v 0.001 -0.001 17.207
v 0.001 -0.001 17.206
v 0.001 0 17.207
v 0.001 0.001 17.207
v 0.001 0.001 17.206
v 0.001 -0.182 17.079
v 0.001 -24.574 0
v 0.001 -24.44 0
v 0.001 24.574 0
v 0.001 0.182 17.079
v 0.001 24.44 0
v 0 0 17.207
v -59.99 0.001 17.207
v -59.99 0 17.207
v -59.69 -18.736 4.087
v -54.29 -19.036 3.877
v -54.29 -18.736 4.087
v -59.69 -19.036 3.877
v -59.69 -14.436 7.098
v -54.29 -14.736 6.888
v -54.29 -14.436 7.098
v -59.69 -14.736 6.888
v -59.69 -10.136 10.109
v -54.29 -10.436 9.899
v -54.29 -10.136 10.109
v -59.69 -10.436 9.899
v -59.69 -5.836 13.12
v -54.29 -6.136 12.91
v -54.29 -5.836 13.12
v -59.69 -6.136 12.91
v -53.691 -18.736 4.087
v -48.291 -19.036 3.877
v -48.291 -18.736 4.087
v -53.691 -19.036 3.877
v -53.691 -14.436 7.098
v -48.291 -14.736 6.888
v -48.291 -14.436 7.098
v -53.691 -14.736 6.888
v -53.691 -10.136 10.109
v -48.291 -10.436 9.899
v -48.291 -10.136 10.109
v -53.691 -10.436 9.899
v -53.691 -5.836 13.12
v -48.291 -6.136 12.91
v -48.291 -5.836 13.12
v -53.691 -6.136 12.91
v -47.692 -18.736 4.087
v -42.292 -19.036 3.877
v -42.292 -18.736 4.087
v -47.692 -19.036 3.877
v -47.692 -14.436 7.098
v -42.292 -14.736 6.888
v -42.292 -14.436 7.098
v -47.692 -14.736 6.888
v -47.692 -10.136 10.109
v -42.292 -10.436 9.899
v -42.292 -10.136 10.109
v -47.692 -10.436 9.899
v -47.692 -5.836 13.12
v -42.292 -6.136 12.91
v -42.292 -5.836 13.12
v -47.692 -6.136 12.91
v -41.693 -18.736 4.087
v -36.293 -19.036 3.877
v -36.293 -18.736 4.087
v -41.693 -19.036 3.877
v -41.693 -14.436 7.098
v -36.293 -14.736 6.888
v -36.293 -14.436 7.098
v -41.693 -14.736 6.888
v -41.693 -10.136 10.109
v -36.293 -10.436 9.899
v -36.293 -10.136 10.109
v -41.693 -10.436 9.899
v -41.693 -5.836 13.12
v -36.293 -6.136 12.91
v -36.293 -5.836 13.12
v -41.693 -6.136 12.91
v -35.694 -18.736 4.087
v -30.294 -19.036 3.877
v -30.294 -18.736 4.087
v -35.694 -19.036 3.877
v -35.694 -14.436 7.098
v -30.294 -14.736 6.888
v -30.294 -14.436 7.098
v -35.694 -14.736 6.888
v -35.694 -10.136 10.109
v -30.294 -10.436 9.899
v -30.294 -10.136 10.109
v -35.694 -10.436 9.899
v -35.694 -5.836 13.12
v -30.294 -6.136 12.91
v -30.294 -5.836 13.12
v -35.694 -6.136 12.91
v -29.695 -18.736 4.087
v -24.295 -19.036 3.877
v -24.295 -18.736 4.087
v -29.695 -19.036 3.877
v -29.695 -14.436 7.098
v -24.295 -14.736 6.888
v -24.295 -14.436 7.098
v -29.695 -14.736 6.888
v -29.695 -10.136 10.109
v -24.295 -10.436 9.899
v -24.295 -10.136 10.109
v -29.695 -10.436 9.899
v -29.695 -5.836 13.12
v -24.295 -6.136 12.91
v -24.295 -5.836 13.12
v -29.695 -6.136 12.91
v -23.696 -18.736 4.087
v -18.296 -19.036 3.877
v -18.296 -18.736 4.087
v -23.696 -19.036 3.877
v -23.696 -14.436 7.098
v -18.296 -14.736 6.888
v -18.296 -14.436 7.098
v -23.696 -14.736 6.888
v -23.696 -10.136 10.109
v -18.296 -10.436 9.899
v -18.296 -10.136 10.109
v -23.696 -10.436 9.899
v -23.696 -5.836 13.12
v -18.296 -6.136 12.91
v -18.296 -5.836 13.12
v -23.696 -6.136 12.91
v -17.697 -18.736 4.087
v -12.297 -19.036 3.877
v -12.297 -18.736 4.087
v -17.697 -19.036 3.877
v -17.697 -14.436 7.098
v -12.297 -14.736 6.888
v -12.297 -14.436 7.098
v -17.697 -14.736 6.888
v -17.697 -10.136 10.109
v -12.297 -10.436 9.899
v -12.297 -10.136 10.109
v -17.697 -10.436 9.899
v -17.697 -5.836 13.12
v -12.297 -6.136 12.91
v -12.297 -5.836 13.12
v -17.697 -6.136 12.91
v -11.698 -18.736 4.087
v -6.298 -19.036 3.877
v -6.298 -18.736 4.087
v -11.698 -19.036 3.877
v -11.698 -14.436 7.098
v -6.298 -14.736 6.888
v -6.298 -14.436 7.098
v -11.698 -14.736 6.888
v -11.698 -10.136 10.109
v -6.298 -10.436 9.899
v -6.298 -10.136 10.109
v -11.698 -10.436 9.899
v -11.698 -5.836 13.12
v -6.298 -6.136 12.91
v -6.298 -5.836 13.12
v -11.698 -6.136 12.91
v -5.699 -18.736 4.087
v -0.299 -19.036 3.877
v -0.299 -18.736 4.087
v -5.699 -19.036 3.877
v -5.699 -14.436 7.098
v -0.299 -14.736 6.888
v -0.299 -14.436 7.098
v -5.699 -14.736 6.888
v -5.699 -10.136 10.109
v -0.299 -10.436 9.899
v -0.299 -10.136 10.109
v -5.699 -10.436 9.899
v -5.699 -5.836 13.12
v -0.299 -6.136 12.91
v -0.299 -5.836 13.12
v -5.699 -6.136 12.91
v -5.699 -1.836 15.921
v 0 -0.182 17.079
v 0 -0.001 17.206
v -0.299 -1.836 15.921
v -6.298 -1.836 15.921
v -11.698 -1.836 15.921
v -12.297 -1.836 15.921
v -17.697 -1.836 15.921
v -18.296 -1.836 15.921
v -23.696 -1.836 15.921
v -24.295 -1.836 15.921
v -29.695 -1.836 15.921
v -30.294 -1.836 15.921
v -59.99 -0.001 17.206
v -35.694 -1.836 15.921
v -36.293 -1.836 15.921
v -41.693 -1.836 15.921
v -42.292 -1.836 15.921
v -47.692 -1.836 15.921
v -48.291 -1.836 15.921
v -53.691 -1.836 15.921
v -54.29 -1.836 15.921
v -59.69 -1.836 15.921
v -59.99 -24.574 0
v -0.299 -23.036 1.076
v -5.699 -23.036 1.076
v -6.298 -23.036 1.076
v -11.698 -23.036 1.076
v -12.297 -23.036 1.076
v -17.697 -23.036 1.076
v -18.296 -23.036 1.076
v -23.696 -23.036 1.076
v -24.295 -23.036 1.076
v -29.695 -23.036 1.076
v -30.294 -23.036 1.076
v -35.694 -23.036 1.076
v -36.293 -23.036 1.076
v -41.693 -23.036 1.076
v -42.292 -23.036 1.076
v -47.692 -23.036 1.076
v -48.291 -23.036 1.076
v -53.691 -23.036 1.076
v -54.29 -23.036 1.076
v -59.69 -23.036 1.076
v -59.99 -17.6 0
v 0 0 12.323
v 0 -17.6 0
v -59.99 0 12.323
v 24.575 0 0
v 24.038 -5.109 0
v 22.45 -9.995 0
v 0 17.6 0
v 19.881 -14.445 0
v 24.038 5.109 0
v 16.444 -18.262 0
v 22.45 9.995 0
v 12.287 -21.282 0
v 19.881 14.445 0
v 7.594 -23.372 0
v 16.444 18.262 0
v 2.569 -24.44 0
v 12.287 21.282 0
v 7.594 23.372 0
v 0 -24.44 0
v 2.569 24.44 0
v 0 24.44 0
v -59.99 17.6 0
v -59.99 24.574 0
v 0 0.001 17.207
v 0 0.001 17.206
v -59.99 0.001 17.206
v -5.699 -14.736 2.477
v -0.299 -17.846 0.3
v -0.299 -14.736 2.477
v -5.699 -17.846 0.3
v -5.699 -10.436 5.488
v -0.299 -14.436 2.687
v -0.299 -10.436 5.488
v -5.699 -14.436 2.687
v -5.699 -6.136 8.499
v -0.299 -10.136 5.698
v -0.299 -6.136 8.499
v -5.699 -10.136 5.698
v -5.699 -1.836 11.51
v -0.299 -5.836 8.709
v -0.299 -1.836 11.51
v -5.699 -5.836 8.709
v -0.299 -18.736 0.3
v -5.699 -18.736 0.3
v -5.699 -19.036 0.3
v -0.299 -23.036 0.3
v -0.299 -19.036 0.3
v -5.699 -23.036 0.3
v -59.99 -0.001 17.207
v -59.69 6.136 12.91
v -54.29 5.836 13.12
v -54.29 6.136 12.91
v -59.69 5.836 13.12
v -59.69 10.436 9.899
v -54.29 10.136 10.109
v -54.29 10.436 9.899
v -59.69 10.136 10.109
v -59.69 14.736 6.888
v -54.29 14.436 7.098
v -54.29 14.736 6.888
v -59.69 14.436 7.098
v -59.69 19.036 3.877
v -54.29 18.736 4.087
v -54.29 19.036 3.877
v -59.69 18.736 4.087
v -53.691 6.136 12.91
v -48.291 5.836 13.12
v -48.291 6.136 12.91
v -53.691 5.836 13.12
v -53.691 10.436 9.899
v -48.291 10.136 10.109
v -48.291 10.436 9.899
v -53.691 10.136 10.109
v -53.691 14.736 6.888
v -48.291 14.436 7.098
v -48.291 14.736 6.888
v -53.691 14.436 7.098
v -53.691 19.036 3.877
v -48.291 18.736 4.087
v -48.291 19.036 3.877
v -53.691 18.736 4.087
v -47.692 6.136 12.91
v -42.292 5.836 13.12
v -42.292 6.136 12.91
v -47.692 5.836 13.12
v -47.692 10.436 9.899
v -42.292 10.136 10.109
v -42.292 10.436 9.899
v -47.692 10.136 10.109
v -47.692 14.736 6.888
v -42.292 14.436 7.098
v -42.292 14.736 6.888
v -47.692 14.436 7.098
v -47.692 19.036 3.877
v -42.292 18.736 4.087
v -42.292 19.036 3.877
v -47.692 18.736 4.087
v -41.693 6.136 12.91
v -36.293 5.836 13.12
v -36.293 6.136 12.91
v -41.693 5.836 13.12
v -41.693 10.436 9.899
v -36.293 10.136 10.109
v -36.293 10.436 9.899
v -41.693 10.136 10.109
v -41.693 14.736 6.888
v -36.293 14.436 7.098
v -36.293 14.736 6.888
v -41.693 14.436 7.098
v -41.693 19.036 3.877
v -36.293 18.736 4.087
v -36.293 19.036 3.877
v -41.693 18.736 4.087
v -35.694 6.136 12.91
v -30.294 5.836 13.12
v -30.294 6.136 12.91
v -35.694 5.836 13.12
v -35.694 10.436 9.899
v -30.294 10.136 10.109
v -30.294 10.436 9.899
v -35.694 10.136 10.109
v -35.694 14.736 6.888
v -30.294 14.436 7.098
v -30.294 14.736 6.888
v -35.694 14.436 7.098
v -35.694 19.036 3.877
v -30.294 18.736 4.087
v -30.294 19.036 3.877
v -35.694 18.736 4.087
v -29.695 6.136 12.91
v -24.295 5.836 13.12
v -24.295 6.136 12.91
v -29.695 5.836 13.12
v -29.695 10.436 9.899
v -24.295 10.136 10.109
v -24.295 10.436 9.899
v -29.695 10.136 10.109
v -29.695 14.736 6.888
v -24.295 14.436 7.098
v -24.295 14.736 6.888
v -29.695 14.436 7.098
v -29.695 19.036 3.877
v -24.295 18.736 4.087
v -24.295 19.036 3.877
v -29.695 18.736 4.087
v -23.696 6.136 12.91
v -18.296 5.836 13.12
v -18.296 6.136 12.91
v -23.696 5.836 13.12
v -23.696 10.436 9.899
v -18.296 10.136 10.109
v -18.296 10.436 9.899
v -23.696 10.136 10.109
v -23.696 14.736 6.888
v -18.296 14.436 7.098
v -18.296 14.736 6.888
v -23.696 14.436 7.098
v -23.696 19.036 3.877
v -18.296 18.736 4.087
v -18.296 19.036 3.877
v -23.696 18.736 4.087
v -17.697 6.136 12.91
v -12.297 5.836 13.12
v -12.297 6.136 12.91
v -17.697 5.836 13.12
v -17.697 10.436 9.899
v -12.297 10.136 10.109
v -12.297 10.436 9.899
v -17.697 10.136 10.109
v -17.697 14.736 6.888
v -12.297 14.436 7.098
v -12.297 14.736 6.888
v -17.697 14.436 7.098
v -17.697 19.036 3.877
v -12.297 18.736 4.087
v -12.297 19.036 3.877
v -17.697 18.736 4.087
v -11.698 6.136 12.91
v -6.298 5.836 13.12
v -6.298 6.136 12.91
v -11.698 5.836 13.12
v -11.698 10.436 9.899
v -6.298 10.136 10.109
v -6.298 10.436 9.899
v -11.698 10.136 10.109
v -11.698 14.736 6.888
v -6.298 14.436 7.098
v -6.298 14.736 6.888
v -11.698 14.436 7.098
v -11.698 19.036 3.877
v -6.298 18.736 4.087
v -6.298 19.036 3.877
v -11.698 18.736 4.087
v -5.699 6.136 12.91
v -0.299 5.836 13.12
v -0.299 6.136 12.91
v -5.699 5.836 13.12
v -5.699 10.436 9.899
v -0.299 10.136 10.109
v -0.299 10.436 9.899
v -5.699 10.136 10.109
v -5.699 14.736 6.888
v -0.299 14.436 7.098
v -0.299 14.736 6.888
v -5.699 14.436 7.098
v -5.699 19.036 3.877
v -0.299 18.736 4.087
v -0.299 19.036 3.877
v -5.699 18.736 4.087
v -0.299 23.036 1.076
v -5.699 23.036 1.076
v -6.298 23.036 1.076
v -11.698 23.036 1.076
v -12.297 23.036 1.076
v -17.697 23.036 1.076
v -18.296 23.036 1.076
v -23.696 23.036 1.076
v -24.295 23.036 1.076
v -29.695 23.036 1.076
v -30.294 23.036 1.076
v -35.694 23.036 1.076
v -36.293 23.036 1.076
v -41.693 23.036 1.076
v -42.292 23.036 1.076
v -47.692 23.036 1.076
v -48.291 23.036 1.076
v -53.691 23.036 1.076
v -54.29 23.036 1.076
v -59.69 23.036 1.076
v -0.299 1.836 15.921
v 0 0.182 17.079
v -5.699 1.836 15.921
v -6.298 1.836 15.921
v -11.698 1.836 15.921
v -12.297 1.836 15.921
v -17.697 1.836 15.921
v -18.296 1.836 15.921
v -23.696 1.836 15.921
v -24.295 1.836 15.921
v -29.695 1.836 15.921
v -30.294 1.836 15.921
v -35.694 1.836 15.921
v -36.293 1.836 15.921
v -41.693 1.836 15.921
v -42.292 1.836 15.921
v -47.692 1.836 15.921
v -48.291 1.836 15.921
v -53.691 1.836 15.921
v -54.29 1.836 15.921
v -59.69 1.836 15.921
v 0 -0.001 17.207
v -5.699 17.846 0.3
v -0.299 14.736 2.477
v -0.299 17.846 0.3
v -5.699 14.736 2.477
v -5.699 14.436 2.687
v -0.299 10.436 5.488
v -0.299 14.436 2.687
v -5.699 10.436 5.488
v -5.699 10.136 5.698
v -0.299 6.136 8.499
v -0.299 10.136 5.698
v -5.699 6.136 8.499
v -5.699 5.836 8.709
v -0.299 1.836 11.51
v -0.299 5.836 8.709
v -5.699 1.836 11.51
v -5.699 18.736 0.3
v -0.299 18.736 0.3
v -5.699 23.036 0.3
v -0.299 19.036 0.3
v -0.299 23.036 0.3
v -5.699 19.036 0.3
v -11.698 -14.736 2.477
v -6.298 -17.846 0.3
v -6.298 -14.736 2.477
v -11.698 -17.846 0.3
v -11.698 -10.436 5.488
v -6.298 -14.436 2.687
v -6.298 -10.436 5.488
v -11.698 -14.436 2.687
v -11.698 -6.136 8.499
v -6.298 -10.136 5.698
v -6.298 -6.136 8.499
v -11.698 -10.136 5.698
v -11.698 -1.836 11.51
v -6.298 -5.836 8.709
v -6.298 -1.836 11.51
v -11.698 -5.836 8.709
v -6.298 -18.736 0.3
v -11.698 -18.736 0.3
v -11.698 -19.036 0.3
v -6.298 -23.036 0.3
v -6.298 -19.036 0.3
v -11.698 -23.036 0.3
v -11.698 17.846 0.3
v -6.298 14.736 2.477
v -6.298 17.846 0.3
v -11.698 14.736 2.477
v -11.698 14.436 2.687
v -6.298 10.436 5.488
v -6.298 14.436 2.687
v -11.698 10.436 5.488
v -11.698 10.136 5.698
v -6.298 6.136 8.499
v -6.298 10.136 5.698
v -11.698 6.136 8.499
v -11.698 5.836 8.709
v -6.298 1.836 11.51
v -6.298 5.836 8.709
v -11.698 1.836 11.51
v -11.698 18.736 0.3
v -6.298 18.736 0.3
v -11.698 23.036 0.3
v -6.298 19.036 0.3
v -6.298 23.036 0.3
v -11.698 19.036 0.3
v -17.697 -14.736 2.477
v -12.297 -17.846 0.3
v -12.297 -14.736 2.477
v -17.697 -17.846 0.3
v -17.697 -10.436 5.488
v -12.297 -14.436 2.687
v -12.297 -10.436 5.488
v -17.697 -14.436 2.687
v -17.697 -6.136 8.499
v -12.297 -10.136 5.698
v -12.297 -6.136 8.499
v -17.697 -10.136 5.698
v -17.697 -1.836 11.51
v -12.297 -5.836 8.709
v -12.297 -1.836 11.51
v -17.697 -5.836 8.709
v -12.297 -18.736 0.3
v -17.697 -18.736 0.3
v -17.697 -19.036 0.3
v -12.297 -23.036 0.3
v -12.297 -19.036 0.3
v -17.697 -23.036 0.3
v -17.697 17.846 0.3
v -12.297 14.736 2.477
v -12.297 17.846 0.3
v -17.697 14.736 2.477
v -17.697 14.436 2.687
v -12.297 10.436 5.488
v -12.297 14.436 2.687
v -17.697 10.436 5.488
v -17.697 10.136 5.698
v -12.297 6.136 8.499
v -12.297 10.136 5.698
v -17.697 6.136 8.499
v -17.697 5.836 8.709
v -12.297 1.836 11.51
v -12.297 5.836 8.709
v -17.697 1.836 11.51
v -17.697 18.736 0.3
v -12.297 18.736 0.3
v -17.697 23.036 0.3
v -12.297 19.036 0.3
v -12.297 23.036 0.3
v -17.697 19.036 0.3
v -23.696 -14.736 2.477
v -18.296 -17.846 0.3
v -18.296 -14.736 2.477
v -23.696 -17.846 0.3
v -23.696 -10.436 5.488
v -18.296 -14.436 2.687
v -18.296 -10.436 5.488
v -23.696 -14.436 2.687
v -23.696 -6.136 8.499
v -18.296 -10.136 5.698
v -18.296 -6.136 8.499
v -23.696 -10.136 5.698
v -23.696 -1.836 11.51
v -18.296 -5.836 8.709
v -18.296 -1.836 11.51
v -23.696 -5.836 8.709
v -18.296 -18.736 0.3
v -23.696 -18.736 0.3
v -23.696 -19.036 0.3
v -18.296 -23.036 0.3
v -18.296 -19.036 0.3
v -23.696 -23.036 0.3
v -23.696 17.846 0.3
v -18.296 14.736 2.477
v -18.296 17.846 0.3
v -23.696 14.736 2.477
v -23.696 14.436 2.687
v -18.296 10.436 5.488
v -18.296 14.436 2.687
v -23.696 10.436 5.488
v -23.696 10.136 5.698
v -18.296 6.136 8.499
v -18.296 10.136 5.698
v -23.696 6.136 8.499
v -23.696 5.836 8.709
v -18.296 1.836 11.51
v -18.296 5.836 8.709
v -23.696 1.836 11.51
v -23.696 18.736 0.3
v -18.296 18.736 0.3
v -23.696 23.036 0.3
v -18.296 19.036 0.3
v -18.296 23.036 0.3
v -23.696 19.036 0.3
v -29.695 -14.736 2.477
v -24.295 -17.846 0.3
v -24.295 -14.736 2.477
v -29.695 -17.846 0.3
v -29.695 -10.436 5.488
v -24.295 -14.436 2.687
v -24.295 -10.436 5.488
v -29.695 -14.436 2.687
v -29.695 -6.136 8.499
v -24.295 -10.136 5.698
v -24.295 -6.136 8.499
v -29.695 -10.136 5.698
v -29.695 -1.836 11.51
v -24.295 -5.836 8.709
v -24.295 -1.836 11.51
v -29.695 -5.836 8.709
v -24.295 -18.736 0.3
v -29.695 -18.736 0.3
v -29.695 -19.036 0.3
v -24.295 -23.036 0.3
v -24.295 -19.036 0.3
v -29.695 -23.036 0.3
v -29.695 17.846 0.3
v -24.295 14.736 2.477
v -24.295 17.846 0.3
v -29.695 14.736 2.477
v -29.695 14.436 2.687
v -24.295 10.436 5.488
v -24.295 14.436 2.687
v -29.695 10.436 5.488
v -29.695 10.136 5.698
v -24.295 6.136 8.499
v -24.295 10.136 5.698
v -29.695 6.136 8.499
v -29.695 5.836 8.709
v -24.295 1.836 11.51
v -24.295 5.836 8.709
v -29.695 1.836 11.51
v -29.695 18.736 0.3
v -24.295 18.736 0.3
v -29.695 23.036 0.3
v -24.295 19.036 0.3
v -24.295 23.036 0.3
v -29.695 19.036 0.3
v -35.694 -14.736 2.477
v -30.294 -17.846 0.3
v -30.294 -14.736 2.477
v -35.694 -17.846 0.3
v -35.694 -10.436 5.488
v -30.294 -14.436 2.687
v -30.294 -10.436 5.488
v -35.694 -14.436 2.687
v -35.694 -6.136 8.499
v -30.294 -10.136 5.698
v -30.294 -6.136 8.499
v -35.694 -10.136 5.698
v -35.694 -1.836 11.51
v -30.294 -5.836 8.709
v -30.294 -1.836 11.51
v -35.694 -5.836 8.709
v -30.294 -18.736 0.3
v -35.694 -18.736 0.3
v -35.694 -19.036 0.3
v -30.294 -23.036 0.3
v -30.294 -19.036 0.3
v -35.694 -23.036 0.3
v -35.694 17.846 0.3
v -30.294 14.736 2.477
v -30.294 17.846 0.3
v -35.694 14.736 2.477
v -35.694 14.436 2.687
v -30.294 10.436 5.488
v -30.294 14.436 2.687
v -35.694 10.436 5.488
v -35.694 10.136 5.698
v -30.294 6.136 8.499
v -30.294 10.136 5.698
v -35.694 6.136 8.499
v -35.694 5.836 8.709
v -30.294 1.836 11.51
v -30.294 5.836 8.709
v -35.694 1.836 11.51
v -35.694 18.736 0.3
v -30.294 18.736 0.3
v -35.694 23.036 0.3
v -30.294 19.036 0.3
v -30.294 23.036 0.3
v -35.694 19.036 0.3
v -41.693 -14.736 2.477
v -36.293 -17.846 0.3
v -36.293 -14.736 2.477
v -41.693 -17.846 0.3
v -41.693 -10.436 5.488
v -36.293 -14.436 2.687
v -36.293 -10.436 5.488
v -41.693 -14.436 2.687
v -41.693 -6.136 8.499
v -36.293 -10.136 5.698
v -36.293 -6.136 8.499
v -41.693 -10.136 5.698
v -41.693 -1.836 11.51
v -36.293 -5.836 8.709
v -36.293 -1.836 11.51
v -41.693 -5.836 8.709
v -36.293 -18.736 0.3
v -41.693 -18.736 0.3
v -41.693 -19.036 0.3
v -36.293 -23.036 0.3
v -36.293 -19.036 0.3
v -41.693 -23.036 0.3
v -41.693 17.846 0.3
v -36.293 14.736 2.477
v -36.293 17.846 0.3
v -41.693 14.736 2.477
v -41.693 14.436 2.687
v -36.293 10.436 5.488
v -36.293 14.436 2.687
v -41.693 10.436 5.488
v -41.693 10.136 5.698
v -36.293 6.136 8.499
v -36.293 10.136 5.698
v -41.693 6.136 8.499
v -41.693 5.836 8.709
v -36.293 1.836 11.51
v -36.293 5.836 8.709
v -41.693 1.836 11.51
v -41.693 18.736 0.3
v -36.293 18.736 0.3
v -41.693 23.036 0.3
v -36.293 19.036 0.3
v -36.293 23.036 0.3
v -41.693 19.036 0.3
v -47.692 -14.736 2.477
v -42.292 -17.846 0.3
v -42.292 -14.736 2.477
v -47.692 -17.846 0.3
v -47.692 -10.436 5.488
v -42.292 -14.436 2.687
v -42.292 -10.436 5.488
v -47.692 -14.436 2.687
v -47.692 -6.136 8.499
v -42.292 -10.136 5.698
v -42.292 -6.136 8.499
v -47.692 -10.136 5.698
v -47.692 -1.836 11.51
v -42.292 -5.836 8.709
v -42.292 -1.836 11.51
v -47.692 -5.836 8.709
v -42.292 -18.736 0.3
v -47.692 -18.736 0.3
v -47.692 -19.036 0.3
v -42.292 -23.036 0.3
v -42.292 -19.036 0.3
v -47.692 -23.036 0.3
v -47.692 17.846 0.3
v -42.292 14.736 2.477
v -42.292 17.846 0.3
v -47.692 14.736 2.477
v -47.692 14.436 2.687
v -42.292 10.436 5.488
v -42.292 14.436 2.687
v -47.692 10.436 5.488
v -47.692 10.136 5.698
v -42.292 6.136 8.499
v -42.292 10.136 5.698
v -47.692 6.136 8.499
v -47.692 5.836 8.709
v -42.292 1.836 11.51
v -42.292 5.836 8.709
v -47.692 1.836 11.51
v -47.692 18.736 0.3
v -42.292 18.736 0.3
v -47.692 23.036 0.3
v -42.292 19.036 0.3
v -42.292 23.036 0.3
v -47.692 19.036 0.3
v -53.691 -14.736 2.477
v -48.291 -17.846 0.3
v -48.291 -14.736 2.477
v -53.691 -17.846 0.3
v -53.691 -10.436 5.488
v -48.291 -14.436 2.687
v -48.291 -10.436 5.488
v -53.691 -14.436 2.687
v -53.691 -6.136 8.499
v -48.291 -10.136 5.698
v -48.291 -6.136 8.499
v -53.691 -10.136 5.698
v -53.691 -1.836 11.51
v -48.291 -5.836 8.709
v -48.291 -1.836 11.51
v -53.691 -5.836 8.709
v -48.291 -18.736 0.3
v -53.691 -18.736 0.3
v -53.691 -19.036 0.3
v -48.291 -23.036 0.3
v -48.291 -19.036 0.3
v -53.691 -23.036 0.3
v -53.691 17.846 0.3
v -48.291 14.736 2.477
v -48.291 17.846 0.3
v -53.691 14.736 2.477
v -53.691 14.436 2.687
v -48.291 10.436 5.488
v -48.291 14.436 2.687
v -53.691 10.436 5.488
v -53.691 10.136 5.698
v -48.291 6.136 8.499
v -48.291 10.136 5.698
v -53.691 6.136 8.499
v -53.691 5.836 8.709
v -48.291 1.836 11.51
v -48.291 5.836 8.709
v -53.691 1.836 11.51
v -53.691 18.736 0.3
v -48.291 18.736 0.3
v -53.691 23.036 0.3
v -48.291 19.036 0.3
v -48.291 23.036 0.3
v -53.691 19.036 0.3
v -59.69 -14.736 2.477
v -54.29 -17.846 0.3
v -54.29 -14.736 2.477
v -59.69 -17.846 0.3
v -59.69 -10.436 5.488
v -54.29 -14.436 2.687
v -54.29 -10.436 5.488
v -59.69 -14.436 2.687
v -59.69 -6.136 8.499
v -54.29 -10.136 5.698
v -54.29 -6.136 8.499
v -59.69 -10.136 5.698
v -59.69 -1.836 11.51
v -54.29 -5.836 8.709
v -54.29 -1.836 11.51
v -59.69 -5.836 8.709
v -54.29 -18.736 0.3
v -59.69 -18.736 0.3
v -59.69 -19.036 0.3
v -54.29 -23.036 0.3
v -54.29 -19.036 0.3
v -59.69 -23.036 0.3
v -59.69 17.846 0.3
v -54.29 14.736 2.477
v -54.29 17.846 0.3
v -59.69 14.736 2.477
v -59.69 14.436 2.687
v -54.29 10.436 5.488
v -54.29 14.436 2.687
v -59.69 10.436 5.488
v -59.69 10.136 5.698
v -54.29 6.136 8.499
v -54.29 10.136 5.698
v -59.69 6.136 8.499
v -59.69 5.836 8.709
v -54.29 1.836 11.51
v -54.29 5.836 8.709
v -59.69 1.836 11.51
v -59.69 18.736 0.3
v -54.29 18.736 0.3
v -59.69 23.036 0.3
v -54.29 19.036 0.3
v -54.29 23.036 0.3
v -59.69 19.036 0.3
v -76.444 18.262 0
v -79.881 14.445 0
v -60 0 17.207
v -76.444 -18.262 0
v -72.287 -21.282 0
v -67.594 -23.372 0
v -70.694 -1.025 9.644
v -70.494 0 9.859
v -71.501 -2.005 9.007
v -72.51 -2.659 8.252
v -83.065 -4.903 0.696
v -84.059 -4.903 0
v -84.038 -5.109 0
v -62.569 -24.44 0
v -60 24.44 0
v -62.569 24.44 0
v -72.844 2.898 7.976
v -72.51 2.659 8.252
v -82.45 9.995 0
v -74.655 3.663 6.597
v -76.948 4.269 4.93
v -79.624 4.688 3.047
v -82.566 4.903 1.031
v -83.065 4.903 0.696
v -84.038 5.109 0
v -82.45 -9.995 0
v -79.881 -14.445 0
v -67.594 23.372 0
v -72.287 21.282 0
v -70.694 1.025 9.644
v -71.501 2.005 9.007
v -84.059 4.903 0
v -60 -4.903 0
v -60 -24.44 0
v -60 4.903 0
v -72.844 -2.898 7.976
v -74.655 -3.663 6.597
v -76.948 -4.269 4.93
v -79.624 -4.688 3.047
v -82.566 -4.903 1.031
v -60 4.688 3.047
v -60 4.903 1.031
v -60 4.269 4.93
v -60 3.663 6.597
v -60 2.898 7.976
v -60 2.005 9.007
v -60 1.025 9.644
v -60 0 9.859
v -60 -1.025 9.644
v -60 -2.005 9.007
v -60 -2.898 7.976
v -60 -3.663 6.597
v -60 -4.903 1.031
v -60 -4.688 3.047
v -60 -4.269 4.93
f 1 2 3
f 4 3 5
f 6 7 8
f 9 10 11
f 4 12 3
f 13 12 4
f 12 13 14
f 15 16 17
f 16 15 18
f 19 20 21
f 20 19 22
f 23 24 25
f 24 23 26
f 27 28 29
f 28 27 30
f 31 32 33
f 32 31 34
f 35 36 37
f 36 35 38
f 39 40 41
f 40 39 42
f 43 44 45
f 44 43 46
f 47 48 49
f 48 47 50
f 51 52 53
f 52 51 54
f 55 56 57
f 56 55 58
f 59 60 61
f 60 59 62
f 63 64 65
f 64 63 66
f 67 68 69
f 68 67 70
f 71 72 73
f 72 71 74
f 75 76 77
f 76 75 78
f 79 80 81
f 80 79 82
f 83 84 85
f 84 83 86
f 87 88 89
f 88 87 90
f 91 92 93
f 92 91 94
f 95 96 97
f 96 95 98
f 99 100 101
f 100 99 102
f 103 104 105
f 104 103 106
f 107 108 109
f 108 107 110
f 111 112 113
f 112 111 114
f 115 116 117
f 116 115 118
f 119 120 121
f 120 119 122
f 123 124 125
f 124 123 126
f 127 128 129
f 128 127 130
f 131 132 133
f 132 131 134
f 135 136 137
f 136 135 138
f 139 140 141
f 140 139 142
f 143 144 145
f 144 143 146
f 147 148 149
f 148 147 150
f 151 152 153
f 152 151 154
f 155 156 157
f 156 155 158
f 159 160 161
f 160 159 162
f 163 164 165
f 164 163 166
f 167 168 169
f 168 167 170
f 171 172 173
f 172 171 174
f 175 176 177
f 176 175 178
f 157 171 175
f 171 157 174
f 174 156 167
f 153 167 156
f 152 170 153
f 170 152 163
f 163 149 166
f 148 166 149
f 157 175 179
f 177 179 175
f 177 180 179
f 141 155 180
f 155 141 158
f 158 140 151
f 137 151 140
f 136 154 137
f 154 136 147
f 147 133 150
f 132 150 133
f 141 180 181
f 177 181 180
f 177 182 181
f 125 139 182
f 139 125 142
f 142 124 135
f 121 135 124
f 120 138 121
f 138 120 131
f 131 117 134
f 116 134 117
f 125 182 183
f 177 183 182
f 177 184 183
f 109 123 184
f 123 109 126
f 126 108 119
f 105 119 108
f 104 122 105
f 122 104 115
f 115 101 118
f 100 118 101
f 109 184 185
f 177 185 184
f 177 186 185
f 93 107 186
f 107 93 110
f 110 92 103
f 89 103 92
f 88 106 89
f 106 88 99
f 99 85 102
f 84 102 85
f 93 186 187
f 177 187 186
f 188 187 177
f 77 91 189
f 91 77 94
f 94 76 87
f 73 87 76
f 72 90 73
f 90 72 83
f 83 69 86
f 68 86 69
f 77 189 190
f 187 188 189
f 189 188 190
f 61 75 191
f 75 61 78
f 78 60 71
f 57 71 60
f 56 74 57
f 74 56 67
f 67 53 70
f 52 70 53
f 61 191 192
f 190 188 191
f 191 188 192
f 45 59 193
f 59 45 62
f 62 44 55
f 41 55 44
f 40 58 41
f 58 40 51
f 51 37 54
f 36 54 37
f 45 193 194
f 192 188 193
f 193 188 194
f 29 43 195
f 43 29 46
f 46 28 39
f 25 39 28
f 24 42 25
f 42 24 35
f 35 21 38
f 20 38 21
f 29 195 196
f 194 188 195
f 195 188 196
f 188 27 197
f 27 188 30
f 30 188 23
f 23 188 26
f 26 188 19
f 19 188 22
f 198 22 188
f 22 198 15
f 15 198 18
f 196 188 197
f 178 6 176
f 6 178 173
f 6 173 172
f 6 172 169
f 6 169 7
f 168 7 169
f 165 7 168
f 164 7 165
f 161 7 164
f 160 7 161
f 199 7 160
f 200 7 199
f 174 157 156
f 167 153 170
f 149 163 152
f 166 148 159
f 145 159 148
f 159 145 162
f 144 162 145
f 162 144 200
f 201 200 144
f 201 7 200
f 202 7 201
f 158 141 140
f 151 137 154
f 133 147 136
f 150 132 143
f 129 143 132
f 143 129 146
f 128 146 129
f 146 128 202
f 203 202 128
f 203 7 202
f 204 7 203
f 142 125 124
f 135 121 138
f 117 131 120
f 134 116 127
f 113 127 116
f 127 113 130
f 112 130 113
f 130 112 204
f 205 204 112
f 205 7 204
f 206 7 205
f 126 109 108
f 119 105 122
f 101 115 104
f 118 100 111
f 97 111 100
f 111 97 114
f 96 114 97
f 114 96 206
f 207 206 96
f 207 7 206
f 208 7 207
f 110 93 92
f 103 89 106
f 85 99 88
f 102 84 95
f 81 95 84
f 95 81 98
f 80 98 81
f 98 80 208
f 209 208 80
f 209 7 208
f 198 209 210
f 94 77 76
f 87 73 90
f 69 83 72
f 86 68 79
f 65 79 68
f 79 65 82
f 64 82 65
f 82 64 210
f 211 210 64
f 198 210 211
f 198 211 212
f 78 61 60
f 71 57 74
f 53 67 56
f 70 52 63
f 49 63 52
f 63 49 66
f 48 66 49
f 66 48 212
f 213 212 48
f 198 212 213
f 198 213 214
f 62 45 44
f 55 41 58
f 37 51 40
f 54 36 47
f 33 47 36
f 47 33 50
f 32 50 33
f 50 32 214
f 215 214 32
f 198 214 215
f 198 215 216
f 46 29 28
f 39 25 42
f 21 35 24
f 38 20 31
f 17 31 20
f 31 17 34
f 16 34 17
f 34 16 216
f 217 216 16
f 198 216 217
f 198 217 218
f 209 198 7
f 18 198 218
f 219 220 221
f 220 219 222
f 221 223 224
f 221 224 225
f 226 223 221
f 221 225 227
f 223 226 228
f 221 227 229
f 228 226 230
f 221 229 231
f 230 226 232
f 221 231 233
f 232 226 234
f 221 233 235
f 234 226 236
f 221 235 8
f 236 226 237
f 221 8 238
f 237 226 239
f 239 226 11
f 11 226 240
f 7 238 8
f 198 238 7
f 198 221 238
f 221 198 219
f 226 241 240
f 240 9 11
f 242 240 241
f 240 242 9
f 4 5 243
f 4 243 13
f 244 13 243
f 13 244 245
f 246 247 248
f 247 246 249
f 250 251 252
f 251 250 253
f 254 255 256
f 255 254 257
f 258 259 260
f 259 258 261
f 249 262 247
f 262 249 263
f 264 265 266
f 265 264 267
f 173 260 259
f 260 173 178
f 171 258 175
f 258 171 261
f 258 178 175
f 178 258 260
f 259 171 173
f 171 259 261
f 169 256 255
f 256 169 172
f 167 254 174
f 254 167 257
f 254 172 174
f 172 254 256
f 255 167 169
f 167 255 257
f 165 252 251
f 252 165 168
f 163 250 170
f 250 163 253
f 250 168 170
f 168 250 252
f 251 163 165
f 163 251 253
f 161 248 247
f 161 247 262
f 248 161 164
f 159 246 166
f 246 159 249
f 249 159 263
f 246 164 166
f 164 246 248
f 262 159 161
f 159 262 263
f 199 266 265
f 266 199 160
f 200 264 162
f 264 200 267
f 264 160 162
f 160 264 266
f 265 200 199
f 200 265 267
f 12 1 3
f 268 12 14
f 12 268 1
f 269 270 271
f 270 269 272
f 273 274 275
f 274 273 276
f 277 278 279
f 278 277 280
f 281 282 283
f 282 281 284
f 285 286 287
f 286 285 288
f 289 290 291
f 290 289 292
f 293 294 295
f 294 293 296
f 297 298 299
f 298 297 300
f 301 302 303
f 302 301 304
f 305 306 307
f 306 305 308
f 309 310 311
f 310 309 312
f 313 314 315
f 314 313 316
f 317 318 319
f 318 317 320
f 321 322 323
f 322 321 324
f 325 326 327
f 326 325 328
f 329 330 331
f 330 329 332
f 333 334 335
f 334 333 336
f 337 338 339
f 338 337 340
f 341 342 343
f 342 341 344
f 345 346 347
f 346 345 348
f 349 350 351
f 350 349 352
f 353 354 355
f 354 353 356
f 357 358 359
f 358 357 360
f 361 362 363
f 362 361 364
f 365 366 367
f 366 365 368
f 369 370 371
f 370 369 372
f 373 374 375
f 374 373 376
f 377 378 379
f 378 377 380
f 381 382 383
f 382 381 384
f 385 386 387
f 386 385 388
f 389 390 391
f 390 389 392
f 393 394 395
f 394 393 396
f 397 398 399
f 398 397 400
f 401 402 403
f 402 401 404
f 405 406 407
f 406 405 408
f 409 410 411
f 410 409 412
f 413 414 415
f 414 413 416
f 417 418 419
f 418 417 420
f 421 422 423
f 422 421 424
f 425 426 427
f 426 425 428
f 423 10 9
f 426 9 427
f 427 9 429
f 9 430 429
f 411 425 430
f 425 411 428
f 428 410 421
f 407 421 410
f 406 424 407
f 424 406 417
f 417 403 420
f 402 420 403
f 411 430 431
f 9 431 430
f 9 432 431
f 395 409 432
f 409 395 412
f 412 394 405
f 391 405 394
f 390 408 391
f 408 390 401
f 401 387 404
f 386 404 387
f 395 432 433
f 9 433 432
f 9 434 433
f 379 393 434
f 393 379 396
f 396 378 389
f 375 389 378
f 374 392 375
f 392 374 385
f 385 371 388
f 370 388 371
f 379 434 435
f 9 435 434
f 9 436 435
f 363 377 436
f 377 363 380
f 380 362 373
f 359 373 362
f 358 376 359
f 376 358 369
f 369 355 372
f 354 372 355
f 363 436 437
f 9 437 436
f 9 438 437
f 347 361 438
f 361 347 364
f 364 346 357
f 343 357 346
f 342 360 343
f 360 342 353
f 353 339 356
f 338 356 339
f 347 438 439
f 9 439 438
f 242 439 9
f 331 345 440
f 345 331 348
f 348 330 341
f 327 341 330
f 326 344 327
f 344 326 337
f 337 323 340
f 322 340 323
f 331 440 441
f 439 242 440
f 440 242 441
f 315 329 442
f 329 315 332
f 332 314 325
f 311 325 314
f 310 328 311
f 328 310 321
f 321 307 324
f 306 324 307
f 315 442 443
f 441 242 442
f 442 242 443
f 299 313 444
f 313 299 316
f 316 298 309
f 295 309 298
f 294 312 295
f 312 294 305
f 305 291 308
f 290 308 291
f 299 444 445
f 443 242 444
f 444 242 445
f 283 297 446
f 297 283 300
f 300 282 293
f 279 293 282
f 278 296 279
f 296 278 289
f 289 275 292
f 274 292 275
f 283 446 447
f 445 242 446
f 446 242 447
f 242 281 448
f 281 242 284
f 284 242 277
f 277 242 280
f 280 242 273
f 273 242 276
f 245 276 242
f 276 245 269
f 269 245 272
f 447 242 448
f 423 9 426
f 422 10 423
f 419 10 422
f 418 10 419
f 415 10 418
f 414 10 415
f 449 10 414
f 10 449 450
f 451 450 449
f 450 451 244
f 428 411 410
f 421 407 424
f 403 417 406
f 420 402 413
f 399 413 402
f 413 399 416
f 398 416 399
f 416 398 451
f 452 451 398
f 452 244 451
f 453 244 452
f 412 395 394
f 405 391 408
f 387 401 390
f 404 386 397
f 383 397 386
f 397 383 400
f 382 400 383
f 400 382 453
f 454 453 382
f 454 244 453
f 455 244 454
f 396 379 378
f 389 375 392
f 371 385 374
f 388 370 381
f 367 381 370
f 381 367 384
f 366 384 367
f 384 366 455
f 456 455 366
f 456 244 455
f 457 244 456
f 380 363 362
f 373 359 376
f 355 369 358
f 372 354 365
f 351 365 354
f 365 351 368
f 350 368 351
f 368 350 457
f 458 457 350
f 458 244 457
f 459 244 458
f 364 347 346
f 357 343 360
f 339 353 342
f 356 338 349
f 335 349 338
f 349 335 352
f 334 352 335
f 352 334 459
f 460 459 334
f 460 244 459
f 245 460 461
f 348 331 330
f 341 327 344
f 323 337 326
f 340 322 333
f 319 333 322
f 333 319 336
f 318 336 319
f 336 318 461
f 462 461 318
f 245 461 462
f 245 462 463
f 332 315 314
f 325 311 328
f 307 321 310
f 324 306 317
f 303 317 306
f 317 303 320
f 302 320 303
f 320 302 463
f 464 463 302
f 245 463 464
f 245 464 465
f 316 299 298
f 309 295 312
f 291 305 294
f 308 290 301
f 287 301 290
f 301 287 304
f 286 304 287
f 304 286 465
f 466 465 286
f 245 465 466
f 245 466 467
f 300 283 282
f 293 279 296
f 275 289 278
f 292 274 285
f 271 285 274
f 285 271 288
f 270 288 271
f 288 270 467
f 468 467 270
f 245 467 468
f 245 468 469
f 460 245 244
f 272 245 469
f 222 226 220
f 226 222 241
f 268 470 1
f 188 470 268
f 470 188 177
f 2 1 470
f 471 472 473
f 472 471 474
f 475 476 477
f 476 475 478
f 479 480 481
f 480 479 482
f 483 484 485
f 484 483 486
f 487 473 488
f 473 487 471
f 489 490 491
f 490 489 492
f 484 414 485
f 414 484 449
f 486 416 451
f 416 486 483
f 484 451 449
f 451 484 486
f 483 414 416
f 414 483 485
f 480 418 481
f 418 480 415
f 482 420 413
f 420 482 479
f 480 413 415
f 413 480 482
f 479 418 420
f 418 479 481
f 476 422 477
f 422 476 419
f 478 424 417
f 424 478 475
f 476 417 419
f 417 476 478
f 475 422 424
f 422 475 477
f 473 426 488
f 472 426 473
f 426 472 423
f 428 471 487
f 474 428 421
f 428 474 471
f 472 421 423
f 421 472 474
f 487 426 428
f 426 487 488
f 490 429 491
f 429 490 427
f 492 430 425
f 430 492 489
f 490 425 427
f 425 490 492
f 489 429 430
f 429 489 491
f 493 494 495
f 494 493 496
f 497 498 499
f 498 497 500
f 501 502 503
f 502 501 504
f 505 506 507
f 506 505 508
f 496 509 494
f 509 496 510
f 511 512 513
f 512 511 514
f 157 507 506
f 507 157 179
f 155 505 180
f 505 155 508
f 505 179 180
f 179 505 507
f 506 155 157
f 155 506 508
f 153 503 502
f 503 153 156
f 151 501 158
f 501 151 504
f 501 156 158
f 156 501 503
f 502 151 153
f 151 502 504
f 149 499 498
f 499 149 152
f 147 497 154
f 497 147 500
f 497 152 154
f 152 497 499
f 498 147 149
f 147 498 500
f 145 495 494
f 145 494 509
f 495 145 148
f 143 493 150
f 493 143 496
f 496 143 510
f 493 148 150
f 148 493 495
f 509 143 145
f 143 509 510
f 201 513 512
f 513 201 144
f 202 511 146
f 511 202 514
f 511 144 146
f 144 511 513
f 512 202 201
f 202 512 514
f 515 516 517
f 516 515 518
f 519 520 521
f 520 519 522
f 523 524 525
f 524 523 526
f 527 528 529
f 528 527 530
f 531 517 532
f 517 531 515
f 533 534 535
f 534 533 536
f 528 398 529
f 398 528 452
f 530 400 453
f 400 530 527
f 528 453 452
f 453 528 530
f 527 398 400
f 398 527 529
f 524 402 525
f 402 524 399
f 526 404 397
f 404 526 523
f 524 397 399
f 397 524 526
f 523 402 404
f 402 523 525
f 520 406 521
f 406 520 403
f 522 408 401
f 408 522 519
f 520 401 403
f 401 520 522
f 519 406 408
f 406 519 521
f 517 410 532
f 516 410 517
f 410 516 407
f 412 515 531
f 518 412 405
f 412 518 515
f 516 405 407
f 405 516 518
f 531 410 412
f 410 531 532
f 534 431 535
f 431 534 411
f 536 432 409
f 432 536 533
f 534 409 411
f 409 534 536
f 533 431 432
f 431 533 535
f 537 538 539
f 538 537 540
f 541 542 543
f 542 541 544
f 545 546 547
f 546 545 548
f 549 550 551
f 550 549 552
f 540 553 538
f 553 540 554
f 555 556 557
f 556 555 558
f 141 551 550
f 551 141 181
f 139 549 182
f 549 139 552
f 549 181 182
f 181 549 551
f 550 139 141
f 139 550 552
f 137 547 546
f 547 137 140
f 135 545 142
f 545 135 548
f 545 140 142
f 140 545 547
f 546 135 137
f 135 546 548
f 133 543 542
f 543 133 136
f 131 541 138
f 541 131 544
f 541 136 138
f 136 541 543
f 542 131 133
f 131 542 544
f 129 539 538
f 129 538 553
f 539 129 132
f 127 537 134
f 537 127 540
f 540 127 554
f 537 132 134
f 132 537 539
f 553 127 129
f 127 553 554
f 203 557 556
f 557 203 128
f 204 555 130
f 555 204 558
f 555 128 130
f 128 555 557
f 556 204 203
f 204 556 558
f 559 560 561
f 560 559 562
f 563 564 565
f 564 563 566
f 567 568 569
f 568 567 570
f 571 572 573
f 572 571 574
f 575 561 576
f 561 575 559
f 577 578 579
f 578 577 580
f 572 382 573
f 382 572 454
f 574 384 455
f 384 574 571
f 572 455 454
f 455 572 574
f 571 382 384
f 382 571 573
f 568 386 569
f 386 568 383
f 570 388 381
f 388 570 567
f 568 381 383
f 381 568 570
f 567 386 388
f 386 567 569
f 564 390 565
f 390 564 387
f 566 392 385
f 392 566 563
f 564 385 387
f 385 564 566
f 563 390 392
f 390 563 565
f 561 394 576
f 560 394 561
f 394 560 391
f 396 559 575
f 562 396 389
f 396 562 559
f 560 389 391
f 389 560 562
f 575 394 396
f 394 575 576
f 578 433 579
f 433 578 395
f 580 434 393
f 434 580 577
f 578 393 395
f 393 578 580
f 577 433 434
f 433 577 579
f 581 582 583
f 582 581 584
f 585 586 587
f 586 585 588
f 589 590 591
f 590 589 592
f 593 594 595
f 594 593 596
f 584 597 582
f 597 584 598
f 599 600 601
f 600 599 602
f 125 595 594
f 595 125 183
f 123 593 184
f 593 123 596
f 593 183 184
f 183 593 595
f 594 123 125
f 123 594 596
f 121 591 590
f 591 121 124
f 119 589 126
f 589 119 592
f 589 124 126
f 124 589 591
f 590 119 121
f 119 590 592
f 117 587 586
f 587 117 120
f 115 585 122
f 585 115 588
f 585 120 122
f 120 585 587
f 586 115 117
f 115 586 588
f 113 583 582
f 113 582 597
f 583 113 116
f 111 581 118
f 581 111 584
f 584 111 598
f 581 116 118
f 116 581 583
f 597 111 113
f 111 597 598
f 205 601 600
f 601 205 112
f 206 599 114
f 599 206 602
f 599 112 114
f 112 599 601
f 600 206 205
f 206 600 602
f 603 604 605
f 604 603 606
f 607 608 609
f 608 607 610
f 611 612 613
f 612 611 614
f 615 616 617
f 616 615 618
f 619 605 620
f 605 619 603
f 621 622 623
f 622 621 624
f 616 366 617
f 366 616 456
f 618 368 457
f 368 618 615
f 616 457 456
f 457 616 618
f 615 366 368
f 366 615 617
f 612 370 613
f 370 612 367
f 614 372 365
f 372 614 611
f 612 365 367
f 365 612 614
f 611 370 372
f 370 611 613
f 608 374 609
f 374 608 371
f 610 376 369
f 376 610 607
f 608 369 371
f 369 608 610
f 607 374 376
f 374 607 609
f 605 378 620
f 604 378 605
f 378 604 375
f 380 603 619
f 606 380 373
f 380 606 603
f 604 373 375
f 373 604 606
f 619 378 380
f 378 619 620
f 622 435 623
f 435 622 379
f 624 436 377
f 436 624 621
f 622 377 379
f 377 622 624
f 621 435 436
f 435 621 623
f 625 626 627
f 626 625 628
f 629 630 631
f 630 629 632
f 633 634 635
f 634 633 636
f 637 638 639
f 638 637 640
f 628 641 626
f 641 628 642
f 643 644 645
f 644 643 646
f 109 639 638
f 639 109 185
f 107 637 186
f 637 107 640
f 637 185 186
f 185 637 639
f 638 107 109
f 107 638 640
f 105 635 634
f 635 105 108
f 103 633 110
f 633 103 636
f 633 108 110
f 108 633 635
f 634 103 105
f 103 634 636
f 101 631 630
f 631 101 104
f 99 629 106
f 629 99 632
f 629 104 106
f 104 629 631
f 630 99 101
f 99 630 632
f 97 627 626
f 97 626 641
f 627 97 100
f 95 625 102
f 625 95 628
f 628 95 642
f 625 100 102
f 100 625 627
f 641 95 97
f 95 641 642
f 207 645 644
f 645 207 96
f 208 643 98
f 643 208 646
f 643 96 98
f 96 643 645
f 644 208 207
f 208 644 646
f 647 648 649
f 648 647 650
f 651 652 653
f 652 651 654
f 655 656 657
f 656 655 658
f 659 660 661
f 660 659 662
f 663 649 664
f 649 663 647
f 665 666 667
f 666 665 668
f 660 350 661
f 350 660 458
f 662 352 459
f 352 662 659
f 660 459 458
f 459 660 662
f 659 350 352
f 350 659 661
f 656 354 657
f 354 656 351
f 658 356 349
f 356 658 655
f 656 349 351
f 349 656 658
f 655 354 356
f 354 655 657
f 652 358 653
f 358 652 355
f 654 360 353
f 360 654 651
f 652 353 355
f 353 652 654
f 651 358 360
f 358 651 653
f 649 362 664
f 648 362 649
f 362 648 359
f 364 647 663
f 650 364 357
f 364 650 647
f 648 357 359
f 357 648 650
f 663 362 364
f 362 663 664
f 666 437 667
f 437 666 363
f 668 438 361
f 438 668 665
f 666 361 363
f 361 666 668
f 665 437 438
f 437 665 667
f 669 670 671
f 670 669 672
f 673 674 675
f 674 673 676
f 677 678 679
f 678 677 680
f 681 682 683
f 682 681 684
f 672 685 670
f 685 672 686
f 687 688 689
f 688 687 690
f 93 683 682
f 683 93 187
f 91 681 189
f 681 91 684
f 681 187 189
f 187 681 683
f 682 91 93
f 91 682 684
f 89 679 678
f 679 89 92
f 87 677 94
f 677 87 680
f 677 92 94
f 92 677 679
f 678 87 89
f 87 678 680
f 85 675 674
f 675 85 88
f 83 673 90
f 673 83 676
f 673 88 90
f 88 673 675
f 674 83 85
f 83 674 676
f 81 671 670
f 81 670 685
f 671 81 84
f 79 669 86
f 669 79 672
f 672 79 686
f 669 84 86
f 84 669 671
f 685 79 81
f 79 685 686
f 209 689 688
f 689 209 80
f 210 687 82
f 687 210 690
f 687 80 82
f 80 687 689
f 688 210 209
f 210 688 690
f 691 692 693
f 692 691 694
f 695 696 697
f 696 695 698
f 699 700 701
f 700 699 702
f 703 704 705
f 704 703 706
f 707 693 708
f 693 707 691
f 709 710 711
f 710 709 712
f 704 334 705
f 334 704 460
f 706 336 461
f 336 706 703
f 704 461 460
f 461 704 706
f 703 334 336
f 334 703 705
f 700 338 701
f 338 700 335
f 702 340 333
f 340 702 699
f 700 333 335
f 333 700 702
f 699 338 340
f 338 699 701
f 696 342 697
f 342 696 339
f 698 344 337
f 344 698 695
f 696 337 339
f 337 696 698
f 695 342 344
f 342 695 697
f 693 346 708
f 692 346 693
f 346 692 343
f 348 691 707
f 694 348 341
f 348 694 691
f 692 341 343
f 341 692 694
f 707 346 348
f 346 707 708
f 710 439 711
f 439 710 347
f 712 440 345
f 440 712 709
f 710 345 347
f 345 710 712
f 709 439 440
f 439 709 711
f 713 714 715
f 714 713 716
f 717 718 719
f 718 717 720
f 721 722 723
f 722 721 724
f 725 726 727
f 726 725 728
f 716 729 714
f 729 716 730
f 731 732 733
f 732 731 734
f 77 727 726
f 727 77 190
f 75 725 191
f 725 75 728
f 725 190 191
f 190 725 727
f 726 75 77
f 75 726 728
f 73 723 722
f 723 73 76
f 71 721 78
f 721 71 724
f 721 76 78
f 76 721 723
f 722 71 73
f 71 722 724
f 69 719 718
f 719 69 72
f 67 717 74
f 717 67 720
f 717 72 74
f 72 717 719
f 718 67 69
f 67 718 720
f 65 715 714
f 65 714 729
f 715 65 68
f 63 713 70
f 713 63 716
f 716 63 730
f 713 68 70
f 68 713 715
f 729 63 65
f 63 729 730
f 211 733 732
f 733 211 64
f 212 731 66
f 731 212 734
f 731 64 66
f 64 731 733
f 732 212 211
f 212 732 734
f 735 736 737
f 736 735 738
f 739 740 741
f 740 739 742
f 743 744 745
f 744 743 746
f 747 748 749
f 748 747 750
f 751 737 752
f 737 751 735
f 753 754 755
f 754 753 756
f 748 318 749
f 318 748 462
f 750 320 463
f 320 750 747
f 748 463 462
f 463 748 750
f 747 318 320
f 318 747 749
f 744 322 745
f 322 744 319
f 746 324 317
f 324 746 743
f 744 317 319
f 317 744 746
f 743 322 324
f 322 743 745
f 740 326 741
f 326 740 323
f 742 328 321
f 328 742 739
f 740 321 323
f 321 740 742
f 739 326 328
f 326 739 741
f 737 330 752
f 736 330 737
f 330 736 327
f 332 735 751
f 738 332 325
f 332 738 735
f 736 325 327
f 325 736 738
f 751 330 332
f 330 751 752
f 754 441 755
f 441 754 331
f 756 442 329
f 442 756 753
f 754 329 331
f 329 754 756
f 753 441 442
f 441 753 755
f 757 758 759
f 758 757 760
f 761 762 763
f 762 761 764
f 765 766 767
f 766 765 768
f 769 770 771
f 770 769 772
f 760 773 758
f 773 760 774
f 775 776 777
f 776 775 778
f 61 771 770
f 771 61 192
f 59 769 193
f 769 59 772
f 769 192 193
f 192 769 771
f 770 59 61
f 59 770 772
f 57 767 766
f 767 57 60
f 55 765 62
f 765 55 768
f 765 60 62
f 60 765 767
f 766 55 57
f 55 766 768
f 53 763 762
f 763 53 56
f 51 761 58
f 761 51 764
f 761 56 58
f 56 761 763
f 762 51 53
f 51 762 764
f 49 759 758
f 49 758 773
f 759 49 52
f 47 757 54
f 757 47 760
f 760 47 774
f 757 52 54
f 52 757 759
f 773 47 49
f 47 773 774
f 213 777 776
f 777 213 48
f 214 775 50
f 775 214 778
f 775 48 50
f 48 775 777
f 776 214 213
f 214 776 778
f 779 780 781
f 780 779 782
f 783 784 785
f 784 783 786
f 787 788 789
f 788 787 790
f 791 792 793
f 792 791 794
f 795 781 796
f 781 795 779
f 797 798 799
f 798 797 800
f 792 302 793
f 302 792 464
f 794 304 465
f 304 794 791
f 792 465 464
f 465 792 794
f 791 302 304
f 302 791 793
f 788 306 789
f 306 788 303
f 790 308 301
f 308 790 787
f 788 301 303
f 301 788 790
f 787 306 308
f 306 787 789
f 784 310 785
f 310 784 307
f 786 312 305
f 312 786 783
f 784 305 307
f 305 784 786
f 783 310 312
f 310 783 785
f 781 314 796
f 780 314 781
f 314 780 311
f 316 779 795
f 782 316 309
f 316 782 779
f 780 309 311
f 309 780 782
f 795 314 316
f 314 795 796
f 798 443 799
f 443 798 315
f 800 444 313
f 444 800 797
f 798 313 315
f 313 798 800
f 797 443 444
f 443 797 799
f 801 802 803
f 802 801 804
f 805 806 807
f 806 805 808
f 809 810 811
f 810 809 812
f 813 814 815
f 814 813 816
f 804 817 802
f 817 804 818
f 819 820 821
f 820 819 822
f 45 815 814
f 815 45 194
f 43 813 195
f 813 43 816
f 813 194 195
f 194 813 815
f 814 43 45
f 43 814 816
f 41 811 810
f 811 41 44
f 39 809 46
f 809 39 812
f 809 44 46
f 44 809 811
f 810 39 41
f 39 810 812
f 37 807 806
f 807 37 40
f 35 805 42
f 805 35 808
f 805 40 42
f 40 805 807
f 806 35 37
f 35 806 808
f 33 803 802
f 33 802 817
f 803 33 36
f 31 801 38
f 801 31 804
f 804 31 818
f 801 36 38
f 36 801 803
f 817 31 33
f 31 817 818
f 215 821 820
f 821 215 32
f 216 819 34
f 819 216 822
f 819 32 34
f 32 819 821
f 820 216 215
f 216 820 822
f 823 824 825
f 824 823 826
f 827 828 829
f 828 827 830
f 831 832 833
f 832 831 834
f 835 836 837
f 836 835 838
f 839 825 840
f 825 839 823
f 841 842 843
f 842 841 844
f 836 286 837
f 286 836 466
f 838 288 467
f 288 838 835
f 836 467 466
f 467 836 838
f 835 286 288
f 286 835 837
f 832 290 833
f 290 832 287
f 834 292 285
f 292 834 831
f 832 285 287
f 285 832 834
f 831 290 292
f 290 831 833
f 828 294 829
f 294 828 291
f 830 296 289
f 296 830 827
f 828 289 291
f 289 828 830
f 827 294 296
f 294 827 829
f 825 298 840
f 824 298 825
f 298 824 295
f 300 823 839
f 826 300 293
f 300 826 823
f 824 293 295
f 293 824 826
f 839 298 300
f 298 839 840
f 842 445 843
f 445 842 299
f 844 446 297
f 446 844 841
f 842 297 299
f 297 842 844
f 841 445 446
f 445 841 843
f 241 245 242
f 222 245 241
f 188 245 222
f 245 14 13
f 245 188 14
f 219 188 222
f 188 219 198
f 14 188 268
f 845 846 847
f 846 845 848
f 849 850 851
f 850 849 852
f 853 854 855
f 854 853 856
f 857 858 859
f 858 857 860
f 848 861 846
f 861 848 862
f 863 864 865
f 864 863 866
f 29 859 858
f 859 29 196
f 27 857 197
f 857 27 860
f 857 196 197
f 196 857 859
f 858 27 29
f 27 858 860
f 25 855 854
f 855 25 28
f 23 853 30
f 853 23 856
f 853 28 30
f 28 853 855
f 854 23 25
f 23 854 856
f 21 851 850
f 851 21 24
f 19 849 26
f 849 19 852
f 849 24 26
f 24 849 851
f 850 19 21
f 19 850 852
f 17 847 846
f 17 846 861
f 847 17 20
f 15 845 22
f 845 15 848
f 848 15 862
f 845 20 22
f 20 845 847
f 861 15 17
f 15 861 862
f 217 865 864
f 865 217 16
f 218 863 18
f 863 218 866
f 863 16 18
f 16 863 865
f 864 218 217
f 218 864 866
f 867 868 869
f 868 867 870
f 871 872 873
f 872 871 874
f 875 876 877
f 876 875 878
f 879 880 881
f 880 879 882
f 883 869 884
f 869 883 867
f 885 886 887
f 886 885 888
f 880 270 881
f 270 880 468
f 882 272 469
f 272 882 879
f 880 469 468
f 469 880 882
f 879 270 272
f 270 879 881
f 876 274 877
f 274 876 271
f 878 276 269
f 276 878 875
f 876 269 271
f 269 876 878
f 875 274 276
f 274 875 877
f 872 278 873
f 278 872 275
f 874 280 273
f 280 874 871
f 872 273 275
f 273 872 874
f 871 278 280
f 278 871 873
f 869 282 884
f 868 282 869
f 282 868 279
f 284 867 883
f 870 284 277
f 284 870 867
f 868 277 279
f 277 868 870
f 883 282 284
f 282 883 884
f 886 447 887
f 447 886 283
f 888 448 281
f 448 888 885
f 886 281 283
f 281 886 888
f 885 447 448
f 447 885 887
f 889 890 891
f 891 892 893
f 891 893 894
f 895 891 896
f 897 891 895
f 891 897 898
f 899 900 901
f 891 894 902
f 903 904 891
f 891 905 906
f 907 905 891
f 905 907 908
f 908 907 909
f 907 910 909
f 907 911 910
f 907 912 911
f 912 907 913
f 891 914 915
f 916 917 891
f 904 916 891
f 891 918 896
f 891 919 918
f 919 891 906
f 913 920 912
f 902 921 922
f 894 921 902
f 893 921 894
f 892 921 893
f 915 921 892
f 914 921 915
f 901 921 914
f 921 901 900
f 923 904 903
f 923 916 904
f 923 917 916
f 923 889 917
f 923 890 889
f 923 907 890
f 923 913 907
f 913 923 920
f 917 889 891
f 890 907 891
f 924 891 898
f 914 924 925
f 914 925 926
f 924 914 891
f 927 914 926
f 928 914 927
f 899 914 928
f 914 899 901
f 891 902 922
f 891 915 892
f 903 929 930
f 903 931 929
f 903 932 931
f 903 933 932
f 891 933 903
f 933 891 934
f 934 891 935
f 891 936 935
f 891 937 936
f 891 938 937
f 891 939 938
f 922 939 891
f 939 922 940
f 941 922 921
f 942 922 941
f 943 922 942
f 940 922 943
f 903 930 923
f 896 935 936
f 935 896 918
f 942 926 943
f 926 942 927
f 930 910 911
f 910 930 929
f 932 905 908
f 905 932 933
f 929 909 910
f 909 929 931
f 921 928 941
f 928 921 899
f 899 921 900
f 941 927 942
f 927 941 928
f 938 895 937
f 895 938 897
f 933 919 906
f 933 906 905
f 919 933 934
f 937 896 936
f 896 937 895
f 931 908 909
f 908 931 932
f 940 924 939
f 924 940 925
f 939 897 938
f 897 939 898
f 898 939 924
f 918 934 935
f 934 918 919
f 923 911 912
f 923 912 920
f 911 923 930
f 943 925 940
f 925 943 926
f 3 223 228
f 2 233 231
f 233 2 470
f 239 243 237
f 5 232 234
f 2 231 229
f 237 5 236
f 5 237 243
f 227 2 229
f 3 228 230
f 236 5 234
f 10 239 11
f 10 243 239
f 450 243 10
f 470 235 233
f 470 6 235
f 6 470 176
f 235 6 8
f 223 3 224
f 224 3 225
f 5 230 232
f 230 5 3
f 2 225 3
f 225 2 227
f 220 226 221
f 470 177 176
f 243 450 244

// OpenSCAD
//Customizable struts for regolith-shielded dugout houses
//Ari M. Diacou - June 2014
//Published at: http://www.thingiverse.com/thing:348765
//Shared under Creative Commons License: Attribution-ShareAlike 3.0 Unported (CC BY-SA 3.0) 
//see http://creativecommons.org/licenses/by-sa/3.0/

// preview[view:south west, tilt:top diagonal]

//Width of a strut
width=6;
//Longest outside length of a strut
length=30;
//Transvers thickness of a strut
thickness=4;
//How wide should the bins be in the length direction
bin_width=4;
//How thick should the walls of the bins be
wall_thickness=.3;
//What is the angle the roof makes with the ground
theta=35;
//Do you want to print a a model, assembeled roof, a sheet of struts, or individual struts? 
assembly="model"; // [model, tent, sheet, struts]
//How many struts to print?
num=10;

/*[Hidden]*/

///// Derived Scalars /////
epsilon=0+0.001;//Used to ensure manifoldness
base=length*cos(theta); //edge of roof to roof ridge
height=length*sin(theta); //height of roof ridge from surface
ep=epsilon; //Who actually likes typing all those characters?
inter_strut_distance = sqrt((3*wall_thickness)*(width/10)); //geometric mean used to automatically space the struts a small distance, using 2 definitions of small.
strut_area_approx=thickness*(length-thickness/2);//An approximation of the area of a strut
strut_depth=strut_area_approx/(2*base);//The minimum depth you need to dig to get enough soil to fill a pair of struts
cone_depth=(3.1415/6)*(base*height)/(width*num);//The depth you need to dig to get enough earth for the mounds at the front and back of the structure
echo("You will need to dig down at least ",(strut_depth+cone_depth)," units to have enough earth for this structure");

/////// MAIN() ///////////

if(assembly=="model"){
	tent(num);
	back();
	front();
	}
if(assembly=="tent"){
	tent(num);
	}
if(assembly=="struts"){
	lineupx(num,inter_strut_distance+width) 
		printable_strut();
	}
if(assembly=="sheet"){
	lineupx(num,width-ep) 
		printable_strut();
	}

///// FUNCTIONS /////////

module front(){
	difference(){
		cylinder(h=height,r1=base,r2=0,center=false);
		translate([-base-ep,-base-ep,-ep])
			cube([base+ep,2*(base+ep),height+2*ep],center=false);
		}
	}

module back(){
	translate([-num*width,0,0]){
		difference(){
			cylinder(h=height,r1=base,r2=0,center=false);
			translate([0,-base-ep,-ep])
				cube([base+ep,2*(base+ep),height+2*ep],center=false);
		scale([1,.5,1])
			rotate([0,90,0])
				cylinder(h=2*(base+ep),r=.8*(height-thickness/cos(theta)),center=true);
			}
		}
	}

module tent(num){
	lineupx(num,width-ep) pair();
	}

module printable_strut(){
	translate([0,0,thickness])
		rotate([-theta,0,0])
			translate([2*width,base/2,-height/2])
				left();
	}

//module copy_printable_strut(){
//	translate([
//		2*width,
//		length*(-0.5+cos(theta))-2*thickness*sin(theta),
//		-height*sin(theta)+(-1+sin(theta))*thickness])
//			rotate([-theta,0,0]) 
//				left();
//	}

//module bottom(){
//	delta=thickness-wall_thickness;
//	intersection(){
//		preform();
//		translate([0,delta*cos(theta),-delta*sin(theta)]) preform();
//		}
//	}

module bottom2(){
	delta=thickness-wall_thickness;
	difference(){
		preform();
		translate([0,-wall_thickness*cos(theta),wall_thickness]) preform();
		}
	}

module pair(){
	translate([0,ep,0]) left(); 
	translate([0,-ep,0])right();
	}

module left(){
	union(){
		bottom2();
		difference(){
			preform();
			bins();
			}
		}
	}

module right(){
	mirror([0,1,0])
		left();
	}

module lineupy(num, space) {
   for (i = [1 : num])
     translate([ 0, -space*i, 0 ]) child();
 }

module lineupx(num, space) {
   for (i = [1 : num])
     translate([-space*i,0,0]) child();
 }

module show_regolith(){
	intersection(){
		preform();
		bins();
		}
	}
 
module bins(){
	num_bins=floor(base/(bin_width+wall_thickness));
	diff=base-num_bins*(bin_width+wall_thickness);
	lineupy(num_bins, bin_width+wall_thickness) 
		//color("DarkRed") 
			translate([wall_thickness,-diff/2,0])		
				cube([width-2*wall_thickness,bin_width,height]);
	}

module preform(){
	difference(){
		translate([0,-length*cos(theta)+thickness*sin(theta),-thickness*cos(theta)])
			rotate([theta,0,0]) 
				cube([width,length,thickness],center=false);
		
		//color("blue")	
			translate([-ep,-length-ep,-thickness])
				rotate([0,0,0]) 
					cube([width+2*ep,2*length,thickness],center=false);
		
		//color("red")	
			translate([-ep,thickness,-length])
				rotate([90,0,0]) 
					cube([width+2*ep,2*length,thickness],center=false);
		}
	}
